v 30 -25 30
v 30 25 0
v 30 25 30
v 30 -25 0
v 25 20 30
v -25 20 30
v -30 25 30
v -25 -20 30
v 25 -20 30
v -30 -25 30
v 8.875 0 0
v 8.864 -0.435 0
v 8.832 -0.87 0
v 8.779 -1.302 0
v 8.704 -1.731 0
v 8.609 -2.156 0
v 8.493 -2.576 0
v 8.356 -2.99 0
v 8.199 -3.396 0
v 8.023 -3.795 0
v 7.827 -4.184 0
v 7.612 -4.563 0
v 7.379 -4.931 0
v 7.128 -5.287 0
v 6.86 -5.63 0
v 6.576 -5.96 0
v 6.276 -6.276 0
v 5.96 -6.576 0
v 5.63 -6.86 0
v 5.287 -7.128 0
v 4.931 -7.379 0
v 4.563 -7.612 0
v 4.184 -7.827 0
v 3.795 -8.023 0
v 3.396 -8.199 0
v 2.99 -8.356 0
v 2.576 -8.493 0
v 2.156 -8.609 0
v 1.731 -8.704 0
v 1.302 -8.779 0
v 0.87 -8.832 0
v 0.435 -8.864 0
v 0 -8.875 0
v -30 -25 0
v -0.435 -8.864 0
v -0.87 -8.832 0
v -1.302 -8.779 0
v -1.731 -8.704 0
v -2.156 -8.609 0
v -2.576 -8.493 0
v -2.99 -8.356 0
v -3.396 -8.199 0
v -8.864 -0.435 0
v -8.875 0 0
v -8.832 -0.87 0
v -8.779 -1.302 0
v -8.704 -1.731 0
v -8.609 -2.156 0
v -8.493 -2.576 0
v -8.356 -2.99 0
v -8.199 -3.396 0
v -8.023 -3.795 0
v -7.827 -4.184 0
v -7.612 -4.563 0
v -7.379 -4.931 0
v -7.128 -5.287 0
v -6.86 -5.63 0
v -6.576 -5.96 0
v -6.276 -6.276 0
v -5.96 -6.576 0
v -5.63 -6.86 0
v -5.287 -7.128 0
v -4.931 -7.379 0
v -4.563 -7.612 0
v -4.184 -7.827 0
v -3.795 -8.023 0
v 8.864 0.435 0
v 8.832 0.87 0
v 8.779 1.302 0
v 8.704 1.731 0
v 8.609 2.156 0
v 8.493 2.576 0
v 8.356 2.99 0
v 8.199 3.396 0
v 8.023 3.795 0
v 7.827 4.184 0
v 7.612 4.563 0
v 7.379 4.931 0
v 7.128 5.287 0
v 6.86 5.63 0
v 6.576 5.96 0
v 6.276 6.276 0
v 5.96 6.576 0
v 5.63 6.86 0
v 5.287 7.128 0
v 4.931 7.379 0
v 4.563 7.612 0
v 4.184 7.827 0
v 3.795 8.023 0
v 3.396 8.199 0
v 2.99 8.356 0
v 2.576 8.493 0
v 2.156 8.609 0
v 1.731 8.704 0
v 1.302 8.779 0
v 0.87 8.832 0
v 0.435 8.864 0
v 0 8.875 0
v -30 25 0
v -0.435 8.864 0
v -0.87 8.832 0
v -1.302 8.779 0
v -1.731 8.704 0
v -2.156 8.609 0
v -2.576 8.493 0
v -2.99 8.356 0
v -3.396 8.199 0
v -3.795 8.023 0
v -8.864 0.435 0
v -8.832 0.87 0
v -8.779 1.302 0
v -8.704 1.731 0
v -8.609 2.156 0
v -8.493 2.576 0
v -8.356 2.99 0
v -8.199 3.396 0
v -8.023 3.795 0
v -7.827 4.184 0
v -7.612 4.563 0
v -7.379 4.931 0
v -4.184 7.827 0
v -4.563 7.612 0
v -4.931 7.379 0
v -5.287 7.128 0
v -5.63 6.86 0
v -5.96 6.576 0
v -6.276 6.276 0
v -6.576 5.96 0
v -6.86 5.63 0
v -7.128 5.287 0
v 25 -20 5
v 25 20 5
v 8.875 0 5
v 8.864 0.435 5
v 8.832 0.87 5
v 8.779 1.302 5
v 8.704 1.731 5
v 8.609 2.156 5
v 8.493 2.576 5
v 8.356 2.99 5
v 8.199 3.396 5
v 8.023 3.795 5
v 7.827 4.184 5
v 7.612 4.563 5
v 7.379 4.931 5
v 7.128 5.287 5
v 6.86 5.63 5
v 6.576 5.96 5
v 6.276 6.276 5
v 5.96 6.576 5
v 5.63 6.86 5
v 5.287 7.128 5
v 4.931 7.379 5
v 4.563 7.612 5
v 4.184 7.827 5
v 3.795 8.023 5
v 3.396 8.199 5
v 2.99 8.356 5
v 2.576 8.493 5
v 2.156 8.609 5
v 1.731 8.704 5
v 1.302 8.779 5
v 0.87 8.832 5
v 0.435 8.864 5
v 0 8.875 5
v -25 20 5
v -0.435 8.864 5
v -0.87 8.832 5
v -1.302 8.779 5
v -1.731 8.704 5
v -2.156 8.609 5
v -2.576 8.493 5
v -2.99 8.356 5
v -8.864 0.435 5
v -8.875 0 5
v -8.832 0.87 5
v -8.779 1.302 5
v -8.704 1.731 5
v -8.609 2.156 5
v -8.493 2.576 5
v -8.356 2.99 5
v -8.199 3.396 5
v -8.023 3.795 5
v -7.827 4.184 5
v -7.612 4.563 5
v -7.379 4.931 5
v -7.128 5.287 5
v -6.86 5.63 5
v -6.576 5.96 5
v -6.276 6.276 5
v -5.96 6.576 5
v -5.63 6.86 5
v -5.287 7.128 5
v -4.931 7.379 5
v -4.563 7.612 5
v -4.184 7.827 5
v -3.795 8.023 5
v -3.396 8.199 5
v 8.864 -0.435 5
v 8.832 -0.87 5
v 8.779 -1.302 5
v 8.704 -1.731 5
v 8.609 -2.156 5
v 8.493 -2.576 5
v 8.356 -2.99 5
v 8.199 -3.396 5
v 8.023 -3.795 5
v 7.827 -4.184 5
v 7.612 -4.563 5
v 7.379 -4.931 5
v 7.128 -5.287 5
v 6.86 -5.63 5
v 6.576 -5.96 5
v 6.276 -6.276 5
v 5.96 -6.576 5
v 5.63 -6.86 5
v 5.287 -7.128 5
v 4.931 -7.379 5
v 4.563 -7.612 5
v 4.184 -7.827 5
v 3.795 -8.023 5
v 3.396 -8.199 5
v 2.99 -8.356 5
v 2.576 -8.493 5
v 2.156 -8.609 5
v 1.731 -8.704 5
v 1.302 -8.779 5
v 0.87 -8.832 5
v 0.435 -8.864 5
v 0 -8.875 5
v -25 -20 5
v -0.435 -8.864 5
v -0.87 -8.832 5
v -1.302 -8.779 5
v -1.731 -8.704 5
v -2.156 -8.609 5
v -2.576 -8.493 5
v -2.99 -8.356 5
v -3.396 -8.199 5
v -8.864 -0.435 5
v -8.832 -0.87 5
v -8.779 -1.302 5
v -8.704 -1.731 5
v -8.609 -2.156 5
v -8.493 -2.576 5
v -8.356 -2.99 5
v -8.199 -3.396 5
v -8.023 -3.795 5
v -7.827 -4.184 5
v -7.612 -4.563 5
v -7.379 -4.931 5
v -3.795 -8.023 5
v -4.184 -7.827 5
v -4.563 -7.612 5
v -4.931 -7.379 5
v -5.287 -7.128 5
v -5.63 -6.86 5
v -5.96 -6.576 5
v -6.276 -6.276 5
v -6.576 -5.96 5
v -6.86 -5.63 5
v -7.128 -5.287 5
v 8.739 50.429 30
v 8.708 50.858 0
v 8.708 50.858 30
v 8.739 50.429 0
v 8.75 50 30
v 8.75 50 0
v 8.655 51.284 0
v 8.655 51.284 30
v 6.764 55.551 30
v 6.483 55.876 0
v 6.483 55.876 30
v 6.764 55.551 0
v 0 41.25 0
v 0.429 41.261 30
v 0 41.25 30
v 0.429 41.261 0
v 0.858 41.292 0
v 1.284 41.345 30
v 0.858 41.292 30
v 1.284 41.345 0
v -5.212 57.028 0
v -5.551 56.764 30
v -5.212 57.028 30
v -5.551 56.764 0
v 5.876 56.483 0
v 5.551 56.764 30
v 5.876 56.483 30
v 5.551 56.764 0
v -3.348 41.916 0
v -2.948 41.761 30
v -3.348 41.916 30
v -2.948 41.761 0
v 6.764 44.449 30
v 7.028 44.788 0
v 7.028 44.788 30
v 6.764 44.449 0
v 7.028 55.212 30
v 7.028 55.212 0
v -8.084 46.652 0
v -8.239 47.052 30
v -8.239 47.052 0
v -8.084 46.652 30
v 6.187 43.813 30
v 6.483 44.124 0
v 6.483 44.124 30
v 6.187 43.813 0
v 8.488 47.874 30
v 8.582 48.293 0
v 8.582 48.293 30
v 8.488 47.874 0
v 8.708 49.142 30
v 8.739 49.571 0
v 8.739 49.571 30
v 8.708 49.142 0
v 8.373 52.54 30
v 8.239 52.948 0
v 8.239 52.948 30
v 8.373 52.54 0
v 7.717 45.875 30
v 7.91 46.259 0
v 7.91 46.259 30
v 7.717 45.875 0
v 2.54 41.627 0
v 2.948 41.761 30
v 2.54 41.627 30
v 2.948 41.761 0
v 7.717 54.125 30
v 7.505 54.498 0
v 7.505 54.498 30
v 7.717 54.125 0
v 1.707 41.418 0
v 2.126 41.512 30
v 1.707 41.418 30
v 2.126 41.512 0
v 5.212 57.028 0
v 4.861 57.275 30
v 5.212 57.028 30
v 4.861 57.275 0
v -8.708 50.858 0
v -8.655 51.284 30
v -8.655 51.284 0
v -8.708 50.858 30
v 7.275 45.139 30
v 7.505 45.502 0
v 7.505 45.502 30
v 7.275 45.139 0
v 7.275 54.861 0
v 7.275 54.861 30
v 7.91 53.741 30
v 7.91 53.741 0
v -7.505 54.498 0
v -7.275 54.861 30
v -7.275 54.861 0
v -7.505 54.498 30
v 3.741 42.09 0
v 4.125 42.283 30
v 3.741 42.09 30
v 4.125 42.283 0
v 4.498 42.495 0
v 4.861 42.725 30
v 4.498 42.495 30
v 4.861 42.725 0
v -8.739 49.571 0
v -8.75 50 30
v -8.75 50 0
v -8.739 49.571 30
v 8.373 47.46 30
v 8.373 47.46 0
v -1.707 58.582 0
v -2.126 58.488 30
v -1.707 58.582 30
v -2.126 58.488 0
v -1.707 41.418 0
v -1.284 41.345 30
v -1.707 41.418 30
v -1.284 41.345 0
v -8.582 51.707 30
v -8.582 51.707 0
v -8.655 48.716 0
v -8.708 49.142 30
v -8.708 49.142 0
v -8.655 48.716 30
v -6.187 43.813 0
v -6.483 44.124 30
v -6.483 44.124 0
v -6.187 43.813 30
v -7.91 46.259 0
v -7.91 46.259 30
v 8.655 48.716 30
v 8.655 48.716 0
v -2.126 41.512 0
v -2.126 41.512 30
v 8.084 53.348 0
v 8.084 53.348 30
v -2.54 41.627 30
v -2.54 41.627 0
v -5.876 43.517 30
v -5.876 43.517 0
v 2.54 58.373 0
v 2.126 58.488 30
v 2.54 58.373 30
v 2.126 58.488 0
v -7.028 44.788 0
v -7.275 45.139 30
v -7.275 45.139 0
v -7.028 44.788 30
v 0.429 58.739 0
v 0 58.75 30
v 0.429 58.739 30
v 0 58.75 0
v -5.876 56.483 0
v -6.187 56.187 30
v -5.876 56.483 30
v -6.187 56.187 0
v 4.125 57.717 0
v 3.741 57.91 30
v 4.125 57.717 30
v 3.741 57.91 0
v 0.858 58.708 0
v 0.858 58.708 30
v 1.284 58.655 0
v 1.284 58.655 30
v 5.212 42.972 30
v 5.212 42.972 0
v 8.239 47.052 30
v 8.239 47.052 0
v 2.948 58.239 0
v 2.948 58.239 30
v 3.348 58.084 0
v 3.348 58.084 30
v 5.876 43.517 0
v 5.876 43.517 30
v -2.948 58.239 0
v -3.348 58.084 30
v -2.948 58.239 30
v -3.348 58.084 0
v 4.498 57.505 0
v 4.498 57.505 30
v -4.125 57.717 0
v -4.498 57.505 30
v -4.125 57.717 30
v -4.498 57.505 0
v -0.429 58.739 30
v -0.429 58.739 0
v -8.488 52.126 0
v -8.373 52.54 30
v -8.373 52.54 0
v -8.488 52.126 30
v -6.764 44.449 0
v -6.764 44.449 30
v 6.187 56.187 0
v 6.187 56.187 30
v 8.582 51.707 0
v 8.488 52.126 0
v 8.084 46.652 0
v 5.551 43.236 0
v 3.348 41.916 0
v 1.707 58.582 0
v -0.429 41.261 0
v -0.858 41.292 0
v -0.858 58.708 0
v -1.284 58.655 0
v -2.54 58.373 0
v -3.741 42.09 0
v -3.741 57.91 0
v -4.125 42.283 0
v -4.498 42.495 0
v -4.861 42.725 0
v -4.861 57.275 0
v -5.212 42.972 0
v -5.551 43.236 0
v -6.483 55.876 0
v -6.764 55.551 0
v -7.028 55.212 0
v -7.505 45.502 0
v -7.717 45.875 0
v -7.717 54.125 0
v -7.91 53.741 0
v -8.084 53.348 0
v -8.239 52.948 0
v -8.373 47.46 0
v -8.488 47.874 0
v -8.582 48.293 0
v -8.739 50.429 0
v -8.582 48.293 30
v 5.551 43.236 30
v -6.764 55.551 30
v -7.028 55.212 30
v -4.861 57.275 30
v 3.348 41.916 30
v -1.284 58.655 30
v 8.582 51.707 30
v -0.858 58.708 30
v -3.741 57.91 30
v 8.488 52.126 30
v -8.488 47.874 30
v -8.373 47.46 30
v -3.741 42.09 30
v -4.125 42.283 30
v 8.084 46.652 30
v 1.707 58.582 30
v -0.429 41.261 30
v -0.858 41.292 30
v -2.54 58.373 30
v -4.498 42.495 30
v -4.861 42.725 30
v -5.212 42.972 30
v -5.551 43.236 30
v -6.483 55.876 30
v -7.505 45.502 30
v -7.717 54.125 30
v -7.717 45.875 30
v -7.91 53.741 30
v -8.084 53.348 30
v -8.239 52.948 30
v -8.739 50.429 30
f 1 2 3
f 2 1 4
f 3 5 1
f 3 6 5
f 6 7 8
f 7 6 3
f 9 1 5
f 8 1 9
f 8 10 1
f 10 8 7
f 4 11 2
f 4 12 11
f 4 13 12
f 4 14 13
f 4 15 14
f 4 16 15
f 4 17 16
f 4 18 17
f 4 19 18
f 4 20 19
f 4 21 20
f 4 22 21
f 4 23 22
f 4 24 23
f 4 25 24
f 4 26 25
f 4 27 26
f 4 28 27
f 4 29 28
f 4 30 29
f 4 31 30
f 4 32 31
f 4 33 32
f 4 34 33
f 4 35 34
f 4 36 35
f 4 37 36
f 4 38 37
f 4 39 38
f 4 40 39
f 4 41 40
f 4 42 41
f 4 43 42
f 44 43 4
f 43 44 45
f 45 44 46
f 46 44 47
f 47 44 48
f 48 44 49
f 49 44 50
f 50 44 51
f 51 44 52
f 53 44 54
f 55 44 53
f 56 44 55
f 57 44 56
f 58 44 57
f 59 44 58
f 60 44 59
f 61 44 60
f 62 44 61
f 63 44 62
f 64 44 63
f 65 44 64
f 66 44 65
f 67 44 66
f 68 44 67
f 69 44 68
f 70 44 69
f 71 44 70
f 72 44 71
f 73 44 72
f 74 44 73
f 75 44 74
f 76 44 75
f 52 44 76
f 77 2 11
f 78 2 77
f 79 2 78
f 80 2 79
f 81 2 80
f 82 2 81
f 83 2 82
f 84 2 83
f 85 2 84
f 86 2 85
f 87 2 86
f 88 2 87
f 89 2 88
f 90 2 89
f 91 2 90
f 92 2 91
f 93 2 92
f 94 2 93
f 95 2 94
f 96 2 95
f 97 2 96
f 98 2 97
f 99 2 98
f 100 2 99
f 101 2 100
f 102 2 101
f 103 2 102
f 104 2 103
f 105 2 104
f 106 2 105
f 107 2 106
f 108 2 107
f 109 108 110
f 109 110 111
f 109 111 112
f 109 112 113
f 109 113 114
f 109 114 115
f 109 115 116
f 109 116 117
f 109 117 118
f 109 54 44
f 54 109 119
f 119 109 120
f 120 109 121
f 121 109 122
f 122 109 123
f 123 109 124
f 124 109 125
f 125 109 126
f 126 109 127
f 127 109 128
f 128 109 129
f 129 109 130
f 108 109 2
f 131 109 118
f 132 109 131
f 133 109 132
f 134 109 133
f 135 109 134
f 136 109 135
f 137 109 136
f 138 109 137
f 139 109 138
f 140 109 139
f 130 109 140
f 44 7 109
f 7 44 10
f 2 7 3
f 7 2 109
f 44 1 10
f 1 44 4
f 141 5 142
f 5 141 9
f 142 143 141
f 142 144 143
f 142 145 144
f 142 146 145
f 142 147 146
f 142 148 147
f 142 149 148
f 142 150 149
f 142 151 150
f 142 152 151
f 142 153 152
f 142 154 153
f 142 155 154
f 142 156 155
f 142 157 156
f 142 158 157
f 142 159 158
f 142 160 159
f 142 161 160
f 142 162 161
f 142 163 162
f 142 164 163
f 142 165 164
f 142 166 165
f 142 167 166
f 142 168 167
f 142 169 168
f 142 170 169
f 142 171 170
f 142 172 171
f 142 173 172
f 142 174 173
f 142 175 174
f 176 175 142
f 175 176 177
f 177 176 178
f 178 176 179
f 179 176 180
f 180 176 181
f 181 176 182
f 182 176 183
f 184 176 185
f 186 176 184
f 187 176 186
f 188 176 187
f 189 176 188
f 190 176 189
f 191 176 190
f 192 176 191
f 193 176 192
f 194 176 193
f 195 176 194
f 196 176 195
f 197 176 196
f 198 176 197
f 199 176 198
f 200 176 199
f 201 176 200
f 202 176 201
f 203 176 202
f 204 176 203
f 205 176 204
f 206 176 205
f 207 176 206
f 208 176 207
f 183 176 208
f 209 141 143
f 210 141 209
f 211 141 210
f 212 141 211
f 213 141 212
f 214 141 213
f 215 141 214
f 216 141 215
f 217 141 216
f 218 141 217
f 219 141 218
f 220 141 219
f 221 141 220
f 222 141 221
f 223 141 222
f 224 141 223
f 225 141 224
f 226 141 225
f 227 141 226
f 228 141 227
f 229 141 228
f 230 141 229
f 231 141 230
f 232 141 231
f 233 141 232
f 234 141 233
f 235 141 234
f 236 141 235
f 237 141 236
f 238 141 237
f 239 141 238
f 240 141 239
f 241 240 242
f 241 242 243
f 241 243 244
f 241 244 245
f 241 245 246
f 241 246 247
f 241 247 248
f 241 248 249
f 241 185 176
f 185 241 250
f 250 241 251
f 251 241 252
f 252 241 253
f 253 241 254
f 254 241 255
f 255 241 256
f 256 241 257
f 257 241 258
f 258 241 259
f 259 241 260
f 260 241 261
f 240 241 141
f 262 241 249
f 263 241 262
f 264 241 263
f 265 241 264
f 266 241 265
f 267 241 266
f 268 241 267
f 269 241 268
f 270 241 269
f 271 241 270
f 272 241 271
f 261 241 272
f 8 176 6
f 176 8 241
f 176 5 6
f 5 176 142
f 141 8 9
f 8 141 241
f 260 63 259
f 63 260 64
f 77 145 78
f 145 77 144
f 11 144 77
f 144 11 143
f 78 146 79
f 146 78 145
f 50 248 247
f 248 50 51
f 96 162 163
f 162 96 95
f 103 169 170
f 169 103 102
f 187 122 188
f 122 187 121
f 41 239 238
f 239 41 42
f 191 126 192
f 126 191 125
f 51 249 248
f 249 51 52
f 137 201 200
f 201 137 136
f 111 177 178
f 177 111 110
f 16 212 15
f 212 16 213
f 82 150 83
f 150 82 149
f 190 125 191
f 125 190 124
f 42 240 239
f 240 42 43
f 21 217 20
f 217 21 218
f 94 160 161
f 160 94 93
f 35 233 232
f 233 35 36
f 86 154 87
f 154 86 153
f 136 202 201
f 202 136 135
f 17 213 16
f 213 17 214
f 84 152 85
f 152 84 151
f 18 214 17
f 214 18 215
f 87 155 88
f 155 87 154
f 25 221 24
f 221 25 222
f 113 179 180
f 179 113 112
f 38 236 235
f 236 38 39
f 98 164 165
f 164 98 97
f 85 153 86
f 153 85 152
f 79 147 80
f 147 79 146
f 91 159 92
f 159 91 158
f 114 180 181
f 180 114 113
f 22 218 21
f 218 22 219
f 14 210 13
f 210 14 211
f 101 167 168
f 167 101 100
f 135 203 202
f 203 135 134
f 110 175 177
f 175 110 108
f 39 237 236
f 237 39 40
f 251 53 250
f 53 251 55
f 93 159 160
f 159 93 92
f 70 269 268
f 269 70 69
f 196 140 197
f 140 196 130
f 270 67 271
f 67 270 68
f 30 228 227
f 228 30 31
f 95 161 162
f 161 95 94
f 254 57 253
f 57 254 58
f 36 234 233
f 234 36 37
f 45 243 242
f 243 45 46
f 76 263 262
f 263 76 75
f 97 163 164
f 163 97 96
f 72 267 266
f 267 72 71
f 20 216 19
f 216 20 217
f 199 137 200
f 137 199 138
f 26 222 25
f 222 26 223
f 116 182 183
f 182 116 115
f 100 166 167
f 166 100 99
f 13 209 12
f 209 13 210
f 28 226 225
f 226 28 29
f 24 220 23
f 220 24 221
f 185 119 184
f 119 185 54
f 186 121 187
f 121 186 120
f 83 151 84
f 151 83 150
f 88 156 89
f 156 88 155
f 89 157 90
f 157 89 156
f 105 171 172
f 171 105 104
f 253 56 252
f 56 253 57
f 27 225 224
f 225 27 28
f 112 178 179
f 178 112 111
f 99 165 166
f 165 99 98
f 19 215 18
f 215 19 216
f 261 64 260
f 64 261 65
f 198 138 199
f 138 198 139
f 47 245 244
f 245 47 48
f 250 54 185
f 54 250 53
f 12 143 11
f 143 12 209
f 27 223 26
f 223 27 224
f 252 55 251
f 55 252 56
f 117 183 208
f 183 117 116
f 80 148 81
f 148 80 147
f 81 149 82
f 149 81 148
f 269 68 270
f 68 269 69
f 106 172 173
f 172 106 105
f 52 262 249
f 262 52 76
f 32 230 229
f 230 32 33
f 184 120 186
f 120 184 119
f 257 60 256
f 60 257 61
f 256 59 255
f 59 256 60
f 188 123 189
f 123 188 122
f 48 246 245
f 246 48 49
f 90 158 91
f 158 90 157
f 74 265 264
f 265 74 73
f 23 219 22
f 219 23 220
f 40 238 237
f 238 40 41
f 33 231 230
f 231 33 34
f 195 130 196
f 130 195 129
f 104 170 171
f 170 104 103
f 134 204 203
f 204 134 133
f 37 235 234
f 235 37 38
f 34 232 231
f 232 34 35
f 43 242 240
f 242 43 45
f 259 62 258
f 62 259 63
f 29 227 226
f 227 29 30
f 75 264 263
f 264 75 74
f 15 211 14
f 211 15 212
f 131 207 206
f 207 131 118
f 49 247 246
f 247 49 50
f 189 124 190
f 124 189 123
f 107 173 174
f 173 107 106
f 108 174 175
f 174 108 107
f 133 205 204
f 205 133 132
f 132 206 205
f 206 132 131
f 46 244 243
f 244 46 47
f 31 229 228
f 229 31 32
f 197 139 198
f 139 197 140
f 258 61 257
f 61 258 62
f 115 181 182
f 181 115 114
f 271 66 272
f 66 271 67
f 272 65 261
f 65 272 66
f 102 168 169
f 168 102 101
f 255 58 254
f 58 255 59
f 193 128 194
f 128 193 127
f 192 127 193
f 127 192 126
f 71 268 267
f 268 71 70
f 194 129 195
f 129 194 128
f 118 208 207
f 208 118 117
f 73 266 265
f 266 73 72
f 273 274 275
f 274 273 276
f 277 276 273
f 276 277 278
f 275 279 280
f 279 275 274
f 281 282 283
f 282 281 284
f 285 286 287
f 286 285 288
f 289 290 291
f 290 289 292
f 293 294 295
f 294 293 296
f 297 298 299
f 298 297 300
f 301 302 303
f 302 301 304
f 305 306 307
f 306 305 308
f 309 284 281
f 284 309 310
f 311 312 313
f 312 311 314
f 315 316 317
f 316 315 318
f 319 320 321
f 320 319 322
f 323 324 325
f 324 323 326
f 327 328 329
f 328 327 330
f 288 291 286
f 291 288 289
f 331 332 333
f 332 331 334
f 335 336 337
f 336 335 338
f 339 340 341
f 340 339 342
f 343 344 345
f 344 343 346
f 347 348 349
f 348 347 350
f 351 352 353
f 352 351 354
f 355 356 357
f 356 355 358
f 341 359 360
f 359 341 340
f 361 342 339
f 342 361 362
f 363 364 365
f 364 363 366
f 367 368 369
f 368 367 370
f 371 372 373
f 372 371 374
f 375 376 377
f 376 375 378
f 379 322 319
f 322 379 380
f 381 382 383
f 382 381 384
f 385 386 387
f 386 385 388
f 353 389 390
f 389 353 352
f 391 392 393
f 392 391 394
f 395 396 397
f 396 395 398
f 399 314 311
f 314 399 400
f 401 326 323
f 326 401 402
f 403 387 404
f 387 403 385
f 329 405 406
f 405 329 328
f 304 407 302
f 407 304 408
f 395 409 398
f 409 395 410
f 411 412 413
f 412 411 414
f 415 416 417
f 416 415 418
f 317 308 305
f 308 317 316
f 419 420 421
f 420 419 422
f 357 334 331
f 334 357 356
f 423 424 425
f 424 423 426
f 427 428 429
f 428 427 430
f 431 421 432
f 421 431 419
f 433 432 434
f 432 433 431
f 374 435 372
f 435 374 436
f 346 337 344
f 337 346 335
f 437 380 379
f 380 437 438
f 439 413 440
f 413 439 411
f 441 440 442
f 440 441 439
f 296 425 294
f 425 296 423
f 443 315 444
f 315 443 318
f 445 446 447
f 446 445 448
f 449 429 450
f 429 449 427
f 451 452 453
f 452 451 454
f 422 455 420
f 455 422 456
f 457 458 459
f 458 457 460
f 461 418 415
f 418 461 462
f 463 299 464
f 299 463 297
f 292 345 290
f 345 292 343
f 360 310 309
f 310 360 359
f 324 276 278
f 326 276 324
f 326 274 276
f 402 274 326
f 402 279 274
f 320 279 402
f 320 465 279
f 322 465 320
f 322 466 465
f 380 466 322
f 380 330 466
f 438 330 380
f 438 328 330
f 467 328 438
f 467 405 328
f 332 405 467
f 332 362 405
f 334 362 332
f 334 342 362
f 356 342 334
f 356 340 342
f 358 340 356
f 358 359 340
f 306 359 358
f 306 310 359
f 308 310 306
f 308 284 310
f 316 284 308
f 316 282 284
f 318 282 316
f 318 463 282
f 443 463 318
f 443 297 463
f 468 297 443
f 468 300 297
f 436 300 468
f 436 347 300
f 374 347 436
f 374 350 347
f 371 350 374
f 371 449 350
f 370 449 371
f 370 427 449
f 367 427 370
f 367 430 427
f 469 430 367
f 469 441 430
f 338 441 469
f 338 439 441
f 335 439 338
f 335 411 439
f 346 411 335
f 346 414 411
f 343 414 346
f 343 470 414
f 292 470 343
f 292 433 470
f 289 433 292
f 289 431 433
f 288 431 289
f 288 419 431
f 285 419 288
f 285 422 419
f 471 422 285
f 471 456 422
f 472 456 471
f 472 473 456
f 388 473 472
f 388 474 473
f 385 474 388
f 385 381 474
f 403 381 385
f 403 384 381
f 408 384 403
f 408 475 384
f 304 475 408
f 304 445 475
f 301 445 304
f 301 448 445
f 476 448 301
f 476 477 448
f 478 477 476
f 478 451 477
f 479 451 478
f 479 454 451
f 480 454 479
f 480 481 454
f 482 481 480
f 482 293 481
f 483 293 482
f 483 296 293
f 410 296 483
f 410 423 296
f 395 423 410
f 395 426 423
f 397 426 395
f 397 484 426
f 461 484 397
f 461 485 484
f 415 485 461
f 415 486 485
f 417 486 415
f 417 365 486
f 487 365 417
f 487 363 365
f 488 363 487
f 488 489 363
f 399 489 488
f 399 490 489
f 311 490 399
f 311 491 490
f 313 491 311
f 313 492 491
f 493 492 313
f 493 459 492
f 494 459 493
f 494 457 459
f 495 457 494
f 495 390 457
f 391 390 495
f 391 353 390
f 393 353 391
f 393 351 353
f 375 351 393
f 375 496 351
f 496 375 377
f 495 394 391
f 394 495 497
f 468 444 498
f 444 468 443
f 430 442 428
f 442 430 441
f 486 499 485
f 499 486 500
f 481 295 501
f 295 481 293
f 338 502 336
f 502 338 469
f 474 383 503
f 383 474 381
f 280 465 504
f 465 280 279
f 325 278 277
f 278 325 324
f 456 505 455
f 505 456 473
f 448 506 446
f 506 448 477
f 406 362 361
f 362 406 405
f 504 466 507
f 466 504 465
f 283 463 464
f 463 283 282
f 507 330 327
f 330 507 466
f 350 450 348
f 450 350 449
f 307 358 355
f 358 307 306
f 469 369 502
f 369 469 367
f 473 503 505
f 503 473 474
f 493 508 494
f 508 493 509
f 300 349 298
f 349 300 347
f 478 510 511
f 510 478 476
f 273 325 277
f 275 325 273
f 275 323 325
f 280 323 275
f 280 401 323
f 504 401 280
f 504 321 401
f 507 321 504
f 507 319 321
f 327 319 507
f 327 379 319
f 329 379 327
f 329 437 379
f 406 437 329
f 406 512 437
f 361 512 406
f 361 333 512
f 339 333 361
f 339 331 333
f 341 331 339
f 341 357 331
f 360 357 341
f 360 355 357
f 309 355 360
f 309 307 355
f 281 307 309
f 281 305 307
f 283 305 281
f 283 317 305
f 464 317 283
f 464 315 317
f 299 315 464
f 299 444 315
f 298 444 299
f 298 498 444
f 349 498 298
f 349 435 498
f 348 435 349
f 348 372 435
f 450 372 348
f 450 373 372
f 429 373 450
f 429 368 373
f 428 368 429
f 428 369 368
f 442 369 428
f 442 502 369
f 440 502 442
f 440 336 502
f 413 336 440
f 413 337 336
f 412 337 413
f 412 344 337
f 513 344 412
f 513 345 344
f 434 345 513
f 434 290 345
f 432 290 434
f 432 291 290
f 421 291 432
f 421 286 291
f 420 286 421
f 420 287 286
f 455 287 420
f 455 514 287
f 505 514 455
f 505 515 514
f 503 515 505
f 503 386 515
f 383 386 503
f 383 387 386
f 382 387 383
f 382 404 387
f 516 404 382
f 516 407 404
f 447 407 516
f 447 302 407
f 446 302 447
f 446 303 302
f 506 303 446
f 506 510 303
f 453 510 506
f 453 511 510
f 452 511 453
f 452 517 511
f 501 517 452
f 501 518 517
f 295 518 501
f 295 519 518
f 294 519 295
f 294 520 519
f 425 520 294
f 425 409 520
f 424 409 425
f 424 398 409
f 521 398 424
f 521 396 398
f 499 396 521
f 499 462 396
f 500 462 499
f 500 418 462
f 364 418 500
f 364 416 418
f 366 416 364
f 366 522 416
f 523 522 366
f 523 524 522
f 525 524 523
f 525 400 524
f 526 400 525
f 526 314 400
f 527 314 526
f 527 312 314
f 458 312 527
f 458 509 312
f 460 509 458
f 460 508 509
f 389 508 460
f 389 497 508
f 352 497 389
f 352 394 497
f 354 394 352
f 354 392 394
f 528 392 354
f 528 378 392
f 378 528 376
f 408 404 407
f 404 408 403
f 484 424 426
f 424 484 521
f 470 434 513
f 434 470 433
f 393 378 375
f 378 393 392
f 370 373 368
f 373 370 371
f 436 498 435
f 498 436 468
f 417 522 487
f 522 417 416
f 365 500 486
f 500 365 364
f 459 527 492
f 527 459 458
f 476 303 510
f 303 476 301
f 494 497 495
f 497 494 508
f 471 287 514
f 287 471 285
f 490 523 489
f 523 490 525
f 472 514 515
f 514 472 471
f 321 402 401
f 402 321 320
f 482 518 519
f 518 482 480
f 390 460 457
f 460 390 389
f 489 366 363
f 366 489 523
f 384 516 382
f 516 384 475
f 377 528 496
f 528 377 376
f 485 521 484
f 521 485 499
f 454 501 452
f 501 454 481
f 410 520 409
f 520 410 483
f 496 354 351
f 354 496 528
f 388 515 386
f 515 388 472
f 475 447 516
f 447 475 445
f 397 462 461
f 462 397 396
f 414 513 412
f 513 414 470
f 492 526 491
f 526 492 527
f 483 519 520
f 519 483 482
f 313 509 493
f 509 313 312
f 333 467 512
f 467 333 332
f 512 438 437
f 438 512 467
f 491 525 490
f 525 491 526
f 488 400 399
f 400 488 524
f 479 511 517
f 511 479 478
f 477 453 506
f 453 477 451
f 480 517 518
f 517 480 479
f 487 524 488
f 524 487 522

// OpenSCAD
l = 50;
w =40;
h = 25;
diameter = 17.5;
t = 5; //wall thickness*2
eps = 0.01;
tolerance = 0.25;
desp = 50;
faces = 128;

module molde(){
    difference(){
        translate([-(l/2 + t),-(w/2 + t),0]) 
            cube([l+t*2, w+t*2, h+t]);

        translate([-l/2,-w/2,t]) 
            cube([l,w,h+eps]);
        
        
        translate([0,0,-eps]) 
            cylinder(t+eps*2,d=diameter+tolerance,$fn=faces);
    }
};
molde();

module perno(){

    cylinder(h+t,d=diameter,$fn=faces);
    
};
color("red") translate([0,desp,0]) perno();
